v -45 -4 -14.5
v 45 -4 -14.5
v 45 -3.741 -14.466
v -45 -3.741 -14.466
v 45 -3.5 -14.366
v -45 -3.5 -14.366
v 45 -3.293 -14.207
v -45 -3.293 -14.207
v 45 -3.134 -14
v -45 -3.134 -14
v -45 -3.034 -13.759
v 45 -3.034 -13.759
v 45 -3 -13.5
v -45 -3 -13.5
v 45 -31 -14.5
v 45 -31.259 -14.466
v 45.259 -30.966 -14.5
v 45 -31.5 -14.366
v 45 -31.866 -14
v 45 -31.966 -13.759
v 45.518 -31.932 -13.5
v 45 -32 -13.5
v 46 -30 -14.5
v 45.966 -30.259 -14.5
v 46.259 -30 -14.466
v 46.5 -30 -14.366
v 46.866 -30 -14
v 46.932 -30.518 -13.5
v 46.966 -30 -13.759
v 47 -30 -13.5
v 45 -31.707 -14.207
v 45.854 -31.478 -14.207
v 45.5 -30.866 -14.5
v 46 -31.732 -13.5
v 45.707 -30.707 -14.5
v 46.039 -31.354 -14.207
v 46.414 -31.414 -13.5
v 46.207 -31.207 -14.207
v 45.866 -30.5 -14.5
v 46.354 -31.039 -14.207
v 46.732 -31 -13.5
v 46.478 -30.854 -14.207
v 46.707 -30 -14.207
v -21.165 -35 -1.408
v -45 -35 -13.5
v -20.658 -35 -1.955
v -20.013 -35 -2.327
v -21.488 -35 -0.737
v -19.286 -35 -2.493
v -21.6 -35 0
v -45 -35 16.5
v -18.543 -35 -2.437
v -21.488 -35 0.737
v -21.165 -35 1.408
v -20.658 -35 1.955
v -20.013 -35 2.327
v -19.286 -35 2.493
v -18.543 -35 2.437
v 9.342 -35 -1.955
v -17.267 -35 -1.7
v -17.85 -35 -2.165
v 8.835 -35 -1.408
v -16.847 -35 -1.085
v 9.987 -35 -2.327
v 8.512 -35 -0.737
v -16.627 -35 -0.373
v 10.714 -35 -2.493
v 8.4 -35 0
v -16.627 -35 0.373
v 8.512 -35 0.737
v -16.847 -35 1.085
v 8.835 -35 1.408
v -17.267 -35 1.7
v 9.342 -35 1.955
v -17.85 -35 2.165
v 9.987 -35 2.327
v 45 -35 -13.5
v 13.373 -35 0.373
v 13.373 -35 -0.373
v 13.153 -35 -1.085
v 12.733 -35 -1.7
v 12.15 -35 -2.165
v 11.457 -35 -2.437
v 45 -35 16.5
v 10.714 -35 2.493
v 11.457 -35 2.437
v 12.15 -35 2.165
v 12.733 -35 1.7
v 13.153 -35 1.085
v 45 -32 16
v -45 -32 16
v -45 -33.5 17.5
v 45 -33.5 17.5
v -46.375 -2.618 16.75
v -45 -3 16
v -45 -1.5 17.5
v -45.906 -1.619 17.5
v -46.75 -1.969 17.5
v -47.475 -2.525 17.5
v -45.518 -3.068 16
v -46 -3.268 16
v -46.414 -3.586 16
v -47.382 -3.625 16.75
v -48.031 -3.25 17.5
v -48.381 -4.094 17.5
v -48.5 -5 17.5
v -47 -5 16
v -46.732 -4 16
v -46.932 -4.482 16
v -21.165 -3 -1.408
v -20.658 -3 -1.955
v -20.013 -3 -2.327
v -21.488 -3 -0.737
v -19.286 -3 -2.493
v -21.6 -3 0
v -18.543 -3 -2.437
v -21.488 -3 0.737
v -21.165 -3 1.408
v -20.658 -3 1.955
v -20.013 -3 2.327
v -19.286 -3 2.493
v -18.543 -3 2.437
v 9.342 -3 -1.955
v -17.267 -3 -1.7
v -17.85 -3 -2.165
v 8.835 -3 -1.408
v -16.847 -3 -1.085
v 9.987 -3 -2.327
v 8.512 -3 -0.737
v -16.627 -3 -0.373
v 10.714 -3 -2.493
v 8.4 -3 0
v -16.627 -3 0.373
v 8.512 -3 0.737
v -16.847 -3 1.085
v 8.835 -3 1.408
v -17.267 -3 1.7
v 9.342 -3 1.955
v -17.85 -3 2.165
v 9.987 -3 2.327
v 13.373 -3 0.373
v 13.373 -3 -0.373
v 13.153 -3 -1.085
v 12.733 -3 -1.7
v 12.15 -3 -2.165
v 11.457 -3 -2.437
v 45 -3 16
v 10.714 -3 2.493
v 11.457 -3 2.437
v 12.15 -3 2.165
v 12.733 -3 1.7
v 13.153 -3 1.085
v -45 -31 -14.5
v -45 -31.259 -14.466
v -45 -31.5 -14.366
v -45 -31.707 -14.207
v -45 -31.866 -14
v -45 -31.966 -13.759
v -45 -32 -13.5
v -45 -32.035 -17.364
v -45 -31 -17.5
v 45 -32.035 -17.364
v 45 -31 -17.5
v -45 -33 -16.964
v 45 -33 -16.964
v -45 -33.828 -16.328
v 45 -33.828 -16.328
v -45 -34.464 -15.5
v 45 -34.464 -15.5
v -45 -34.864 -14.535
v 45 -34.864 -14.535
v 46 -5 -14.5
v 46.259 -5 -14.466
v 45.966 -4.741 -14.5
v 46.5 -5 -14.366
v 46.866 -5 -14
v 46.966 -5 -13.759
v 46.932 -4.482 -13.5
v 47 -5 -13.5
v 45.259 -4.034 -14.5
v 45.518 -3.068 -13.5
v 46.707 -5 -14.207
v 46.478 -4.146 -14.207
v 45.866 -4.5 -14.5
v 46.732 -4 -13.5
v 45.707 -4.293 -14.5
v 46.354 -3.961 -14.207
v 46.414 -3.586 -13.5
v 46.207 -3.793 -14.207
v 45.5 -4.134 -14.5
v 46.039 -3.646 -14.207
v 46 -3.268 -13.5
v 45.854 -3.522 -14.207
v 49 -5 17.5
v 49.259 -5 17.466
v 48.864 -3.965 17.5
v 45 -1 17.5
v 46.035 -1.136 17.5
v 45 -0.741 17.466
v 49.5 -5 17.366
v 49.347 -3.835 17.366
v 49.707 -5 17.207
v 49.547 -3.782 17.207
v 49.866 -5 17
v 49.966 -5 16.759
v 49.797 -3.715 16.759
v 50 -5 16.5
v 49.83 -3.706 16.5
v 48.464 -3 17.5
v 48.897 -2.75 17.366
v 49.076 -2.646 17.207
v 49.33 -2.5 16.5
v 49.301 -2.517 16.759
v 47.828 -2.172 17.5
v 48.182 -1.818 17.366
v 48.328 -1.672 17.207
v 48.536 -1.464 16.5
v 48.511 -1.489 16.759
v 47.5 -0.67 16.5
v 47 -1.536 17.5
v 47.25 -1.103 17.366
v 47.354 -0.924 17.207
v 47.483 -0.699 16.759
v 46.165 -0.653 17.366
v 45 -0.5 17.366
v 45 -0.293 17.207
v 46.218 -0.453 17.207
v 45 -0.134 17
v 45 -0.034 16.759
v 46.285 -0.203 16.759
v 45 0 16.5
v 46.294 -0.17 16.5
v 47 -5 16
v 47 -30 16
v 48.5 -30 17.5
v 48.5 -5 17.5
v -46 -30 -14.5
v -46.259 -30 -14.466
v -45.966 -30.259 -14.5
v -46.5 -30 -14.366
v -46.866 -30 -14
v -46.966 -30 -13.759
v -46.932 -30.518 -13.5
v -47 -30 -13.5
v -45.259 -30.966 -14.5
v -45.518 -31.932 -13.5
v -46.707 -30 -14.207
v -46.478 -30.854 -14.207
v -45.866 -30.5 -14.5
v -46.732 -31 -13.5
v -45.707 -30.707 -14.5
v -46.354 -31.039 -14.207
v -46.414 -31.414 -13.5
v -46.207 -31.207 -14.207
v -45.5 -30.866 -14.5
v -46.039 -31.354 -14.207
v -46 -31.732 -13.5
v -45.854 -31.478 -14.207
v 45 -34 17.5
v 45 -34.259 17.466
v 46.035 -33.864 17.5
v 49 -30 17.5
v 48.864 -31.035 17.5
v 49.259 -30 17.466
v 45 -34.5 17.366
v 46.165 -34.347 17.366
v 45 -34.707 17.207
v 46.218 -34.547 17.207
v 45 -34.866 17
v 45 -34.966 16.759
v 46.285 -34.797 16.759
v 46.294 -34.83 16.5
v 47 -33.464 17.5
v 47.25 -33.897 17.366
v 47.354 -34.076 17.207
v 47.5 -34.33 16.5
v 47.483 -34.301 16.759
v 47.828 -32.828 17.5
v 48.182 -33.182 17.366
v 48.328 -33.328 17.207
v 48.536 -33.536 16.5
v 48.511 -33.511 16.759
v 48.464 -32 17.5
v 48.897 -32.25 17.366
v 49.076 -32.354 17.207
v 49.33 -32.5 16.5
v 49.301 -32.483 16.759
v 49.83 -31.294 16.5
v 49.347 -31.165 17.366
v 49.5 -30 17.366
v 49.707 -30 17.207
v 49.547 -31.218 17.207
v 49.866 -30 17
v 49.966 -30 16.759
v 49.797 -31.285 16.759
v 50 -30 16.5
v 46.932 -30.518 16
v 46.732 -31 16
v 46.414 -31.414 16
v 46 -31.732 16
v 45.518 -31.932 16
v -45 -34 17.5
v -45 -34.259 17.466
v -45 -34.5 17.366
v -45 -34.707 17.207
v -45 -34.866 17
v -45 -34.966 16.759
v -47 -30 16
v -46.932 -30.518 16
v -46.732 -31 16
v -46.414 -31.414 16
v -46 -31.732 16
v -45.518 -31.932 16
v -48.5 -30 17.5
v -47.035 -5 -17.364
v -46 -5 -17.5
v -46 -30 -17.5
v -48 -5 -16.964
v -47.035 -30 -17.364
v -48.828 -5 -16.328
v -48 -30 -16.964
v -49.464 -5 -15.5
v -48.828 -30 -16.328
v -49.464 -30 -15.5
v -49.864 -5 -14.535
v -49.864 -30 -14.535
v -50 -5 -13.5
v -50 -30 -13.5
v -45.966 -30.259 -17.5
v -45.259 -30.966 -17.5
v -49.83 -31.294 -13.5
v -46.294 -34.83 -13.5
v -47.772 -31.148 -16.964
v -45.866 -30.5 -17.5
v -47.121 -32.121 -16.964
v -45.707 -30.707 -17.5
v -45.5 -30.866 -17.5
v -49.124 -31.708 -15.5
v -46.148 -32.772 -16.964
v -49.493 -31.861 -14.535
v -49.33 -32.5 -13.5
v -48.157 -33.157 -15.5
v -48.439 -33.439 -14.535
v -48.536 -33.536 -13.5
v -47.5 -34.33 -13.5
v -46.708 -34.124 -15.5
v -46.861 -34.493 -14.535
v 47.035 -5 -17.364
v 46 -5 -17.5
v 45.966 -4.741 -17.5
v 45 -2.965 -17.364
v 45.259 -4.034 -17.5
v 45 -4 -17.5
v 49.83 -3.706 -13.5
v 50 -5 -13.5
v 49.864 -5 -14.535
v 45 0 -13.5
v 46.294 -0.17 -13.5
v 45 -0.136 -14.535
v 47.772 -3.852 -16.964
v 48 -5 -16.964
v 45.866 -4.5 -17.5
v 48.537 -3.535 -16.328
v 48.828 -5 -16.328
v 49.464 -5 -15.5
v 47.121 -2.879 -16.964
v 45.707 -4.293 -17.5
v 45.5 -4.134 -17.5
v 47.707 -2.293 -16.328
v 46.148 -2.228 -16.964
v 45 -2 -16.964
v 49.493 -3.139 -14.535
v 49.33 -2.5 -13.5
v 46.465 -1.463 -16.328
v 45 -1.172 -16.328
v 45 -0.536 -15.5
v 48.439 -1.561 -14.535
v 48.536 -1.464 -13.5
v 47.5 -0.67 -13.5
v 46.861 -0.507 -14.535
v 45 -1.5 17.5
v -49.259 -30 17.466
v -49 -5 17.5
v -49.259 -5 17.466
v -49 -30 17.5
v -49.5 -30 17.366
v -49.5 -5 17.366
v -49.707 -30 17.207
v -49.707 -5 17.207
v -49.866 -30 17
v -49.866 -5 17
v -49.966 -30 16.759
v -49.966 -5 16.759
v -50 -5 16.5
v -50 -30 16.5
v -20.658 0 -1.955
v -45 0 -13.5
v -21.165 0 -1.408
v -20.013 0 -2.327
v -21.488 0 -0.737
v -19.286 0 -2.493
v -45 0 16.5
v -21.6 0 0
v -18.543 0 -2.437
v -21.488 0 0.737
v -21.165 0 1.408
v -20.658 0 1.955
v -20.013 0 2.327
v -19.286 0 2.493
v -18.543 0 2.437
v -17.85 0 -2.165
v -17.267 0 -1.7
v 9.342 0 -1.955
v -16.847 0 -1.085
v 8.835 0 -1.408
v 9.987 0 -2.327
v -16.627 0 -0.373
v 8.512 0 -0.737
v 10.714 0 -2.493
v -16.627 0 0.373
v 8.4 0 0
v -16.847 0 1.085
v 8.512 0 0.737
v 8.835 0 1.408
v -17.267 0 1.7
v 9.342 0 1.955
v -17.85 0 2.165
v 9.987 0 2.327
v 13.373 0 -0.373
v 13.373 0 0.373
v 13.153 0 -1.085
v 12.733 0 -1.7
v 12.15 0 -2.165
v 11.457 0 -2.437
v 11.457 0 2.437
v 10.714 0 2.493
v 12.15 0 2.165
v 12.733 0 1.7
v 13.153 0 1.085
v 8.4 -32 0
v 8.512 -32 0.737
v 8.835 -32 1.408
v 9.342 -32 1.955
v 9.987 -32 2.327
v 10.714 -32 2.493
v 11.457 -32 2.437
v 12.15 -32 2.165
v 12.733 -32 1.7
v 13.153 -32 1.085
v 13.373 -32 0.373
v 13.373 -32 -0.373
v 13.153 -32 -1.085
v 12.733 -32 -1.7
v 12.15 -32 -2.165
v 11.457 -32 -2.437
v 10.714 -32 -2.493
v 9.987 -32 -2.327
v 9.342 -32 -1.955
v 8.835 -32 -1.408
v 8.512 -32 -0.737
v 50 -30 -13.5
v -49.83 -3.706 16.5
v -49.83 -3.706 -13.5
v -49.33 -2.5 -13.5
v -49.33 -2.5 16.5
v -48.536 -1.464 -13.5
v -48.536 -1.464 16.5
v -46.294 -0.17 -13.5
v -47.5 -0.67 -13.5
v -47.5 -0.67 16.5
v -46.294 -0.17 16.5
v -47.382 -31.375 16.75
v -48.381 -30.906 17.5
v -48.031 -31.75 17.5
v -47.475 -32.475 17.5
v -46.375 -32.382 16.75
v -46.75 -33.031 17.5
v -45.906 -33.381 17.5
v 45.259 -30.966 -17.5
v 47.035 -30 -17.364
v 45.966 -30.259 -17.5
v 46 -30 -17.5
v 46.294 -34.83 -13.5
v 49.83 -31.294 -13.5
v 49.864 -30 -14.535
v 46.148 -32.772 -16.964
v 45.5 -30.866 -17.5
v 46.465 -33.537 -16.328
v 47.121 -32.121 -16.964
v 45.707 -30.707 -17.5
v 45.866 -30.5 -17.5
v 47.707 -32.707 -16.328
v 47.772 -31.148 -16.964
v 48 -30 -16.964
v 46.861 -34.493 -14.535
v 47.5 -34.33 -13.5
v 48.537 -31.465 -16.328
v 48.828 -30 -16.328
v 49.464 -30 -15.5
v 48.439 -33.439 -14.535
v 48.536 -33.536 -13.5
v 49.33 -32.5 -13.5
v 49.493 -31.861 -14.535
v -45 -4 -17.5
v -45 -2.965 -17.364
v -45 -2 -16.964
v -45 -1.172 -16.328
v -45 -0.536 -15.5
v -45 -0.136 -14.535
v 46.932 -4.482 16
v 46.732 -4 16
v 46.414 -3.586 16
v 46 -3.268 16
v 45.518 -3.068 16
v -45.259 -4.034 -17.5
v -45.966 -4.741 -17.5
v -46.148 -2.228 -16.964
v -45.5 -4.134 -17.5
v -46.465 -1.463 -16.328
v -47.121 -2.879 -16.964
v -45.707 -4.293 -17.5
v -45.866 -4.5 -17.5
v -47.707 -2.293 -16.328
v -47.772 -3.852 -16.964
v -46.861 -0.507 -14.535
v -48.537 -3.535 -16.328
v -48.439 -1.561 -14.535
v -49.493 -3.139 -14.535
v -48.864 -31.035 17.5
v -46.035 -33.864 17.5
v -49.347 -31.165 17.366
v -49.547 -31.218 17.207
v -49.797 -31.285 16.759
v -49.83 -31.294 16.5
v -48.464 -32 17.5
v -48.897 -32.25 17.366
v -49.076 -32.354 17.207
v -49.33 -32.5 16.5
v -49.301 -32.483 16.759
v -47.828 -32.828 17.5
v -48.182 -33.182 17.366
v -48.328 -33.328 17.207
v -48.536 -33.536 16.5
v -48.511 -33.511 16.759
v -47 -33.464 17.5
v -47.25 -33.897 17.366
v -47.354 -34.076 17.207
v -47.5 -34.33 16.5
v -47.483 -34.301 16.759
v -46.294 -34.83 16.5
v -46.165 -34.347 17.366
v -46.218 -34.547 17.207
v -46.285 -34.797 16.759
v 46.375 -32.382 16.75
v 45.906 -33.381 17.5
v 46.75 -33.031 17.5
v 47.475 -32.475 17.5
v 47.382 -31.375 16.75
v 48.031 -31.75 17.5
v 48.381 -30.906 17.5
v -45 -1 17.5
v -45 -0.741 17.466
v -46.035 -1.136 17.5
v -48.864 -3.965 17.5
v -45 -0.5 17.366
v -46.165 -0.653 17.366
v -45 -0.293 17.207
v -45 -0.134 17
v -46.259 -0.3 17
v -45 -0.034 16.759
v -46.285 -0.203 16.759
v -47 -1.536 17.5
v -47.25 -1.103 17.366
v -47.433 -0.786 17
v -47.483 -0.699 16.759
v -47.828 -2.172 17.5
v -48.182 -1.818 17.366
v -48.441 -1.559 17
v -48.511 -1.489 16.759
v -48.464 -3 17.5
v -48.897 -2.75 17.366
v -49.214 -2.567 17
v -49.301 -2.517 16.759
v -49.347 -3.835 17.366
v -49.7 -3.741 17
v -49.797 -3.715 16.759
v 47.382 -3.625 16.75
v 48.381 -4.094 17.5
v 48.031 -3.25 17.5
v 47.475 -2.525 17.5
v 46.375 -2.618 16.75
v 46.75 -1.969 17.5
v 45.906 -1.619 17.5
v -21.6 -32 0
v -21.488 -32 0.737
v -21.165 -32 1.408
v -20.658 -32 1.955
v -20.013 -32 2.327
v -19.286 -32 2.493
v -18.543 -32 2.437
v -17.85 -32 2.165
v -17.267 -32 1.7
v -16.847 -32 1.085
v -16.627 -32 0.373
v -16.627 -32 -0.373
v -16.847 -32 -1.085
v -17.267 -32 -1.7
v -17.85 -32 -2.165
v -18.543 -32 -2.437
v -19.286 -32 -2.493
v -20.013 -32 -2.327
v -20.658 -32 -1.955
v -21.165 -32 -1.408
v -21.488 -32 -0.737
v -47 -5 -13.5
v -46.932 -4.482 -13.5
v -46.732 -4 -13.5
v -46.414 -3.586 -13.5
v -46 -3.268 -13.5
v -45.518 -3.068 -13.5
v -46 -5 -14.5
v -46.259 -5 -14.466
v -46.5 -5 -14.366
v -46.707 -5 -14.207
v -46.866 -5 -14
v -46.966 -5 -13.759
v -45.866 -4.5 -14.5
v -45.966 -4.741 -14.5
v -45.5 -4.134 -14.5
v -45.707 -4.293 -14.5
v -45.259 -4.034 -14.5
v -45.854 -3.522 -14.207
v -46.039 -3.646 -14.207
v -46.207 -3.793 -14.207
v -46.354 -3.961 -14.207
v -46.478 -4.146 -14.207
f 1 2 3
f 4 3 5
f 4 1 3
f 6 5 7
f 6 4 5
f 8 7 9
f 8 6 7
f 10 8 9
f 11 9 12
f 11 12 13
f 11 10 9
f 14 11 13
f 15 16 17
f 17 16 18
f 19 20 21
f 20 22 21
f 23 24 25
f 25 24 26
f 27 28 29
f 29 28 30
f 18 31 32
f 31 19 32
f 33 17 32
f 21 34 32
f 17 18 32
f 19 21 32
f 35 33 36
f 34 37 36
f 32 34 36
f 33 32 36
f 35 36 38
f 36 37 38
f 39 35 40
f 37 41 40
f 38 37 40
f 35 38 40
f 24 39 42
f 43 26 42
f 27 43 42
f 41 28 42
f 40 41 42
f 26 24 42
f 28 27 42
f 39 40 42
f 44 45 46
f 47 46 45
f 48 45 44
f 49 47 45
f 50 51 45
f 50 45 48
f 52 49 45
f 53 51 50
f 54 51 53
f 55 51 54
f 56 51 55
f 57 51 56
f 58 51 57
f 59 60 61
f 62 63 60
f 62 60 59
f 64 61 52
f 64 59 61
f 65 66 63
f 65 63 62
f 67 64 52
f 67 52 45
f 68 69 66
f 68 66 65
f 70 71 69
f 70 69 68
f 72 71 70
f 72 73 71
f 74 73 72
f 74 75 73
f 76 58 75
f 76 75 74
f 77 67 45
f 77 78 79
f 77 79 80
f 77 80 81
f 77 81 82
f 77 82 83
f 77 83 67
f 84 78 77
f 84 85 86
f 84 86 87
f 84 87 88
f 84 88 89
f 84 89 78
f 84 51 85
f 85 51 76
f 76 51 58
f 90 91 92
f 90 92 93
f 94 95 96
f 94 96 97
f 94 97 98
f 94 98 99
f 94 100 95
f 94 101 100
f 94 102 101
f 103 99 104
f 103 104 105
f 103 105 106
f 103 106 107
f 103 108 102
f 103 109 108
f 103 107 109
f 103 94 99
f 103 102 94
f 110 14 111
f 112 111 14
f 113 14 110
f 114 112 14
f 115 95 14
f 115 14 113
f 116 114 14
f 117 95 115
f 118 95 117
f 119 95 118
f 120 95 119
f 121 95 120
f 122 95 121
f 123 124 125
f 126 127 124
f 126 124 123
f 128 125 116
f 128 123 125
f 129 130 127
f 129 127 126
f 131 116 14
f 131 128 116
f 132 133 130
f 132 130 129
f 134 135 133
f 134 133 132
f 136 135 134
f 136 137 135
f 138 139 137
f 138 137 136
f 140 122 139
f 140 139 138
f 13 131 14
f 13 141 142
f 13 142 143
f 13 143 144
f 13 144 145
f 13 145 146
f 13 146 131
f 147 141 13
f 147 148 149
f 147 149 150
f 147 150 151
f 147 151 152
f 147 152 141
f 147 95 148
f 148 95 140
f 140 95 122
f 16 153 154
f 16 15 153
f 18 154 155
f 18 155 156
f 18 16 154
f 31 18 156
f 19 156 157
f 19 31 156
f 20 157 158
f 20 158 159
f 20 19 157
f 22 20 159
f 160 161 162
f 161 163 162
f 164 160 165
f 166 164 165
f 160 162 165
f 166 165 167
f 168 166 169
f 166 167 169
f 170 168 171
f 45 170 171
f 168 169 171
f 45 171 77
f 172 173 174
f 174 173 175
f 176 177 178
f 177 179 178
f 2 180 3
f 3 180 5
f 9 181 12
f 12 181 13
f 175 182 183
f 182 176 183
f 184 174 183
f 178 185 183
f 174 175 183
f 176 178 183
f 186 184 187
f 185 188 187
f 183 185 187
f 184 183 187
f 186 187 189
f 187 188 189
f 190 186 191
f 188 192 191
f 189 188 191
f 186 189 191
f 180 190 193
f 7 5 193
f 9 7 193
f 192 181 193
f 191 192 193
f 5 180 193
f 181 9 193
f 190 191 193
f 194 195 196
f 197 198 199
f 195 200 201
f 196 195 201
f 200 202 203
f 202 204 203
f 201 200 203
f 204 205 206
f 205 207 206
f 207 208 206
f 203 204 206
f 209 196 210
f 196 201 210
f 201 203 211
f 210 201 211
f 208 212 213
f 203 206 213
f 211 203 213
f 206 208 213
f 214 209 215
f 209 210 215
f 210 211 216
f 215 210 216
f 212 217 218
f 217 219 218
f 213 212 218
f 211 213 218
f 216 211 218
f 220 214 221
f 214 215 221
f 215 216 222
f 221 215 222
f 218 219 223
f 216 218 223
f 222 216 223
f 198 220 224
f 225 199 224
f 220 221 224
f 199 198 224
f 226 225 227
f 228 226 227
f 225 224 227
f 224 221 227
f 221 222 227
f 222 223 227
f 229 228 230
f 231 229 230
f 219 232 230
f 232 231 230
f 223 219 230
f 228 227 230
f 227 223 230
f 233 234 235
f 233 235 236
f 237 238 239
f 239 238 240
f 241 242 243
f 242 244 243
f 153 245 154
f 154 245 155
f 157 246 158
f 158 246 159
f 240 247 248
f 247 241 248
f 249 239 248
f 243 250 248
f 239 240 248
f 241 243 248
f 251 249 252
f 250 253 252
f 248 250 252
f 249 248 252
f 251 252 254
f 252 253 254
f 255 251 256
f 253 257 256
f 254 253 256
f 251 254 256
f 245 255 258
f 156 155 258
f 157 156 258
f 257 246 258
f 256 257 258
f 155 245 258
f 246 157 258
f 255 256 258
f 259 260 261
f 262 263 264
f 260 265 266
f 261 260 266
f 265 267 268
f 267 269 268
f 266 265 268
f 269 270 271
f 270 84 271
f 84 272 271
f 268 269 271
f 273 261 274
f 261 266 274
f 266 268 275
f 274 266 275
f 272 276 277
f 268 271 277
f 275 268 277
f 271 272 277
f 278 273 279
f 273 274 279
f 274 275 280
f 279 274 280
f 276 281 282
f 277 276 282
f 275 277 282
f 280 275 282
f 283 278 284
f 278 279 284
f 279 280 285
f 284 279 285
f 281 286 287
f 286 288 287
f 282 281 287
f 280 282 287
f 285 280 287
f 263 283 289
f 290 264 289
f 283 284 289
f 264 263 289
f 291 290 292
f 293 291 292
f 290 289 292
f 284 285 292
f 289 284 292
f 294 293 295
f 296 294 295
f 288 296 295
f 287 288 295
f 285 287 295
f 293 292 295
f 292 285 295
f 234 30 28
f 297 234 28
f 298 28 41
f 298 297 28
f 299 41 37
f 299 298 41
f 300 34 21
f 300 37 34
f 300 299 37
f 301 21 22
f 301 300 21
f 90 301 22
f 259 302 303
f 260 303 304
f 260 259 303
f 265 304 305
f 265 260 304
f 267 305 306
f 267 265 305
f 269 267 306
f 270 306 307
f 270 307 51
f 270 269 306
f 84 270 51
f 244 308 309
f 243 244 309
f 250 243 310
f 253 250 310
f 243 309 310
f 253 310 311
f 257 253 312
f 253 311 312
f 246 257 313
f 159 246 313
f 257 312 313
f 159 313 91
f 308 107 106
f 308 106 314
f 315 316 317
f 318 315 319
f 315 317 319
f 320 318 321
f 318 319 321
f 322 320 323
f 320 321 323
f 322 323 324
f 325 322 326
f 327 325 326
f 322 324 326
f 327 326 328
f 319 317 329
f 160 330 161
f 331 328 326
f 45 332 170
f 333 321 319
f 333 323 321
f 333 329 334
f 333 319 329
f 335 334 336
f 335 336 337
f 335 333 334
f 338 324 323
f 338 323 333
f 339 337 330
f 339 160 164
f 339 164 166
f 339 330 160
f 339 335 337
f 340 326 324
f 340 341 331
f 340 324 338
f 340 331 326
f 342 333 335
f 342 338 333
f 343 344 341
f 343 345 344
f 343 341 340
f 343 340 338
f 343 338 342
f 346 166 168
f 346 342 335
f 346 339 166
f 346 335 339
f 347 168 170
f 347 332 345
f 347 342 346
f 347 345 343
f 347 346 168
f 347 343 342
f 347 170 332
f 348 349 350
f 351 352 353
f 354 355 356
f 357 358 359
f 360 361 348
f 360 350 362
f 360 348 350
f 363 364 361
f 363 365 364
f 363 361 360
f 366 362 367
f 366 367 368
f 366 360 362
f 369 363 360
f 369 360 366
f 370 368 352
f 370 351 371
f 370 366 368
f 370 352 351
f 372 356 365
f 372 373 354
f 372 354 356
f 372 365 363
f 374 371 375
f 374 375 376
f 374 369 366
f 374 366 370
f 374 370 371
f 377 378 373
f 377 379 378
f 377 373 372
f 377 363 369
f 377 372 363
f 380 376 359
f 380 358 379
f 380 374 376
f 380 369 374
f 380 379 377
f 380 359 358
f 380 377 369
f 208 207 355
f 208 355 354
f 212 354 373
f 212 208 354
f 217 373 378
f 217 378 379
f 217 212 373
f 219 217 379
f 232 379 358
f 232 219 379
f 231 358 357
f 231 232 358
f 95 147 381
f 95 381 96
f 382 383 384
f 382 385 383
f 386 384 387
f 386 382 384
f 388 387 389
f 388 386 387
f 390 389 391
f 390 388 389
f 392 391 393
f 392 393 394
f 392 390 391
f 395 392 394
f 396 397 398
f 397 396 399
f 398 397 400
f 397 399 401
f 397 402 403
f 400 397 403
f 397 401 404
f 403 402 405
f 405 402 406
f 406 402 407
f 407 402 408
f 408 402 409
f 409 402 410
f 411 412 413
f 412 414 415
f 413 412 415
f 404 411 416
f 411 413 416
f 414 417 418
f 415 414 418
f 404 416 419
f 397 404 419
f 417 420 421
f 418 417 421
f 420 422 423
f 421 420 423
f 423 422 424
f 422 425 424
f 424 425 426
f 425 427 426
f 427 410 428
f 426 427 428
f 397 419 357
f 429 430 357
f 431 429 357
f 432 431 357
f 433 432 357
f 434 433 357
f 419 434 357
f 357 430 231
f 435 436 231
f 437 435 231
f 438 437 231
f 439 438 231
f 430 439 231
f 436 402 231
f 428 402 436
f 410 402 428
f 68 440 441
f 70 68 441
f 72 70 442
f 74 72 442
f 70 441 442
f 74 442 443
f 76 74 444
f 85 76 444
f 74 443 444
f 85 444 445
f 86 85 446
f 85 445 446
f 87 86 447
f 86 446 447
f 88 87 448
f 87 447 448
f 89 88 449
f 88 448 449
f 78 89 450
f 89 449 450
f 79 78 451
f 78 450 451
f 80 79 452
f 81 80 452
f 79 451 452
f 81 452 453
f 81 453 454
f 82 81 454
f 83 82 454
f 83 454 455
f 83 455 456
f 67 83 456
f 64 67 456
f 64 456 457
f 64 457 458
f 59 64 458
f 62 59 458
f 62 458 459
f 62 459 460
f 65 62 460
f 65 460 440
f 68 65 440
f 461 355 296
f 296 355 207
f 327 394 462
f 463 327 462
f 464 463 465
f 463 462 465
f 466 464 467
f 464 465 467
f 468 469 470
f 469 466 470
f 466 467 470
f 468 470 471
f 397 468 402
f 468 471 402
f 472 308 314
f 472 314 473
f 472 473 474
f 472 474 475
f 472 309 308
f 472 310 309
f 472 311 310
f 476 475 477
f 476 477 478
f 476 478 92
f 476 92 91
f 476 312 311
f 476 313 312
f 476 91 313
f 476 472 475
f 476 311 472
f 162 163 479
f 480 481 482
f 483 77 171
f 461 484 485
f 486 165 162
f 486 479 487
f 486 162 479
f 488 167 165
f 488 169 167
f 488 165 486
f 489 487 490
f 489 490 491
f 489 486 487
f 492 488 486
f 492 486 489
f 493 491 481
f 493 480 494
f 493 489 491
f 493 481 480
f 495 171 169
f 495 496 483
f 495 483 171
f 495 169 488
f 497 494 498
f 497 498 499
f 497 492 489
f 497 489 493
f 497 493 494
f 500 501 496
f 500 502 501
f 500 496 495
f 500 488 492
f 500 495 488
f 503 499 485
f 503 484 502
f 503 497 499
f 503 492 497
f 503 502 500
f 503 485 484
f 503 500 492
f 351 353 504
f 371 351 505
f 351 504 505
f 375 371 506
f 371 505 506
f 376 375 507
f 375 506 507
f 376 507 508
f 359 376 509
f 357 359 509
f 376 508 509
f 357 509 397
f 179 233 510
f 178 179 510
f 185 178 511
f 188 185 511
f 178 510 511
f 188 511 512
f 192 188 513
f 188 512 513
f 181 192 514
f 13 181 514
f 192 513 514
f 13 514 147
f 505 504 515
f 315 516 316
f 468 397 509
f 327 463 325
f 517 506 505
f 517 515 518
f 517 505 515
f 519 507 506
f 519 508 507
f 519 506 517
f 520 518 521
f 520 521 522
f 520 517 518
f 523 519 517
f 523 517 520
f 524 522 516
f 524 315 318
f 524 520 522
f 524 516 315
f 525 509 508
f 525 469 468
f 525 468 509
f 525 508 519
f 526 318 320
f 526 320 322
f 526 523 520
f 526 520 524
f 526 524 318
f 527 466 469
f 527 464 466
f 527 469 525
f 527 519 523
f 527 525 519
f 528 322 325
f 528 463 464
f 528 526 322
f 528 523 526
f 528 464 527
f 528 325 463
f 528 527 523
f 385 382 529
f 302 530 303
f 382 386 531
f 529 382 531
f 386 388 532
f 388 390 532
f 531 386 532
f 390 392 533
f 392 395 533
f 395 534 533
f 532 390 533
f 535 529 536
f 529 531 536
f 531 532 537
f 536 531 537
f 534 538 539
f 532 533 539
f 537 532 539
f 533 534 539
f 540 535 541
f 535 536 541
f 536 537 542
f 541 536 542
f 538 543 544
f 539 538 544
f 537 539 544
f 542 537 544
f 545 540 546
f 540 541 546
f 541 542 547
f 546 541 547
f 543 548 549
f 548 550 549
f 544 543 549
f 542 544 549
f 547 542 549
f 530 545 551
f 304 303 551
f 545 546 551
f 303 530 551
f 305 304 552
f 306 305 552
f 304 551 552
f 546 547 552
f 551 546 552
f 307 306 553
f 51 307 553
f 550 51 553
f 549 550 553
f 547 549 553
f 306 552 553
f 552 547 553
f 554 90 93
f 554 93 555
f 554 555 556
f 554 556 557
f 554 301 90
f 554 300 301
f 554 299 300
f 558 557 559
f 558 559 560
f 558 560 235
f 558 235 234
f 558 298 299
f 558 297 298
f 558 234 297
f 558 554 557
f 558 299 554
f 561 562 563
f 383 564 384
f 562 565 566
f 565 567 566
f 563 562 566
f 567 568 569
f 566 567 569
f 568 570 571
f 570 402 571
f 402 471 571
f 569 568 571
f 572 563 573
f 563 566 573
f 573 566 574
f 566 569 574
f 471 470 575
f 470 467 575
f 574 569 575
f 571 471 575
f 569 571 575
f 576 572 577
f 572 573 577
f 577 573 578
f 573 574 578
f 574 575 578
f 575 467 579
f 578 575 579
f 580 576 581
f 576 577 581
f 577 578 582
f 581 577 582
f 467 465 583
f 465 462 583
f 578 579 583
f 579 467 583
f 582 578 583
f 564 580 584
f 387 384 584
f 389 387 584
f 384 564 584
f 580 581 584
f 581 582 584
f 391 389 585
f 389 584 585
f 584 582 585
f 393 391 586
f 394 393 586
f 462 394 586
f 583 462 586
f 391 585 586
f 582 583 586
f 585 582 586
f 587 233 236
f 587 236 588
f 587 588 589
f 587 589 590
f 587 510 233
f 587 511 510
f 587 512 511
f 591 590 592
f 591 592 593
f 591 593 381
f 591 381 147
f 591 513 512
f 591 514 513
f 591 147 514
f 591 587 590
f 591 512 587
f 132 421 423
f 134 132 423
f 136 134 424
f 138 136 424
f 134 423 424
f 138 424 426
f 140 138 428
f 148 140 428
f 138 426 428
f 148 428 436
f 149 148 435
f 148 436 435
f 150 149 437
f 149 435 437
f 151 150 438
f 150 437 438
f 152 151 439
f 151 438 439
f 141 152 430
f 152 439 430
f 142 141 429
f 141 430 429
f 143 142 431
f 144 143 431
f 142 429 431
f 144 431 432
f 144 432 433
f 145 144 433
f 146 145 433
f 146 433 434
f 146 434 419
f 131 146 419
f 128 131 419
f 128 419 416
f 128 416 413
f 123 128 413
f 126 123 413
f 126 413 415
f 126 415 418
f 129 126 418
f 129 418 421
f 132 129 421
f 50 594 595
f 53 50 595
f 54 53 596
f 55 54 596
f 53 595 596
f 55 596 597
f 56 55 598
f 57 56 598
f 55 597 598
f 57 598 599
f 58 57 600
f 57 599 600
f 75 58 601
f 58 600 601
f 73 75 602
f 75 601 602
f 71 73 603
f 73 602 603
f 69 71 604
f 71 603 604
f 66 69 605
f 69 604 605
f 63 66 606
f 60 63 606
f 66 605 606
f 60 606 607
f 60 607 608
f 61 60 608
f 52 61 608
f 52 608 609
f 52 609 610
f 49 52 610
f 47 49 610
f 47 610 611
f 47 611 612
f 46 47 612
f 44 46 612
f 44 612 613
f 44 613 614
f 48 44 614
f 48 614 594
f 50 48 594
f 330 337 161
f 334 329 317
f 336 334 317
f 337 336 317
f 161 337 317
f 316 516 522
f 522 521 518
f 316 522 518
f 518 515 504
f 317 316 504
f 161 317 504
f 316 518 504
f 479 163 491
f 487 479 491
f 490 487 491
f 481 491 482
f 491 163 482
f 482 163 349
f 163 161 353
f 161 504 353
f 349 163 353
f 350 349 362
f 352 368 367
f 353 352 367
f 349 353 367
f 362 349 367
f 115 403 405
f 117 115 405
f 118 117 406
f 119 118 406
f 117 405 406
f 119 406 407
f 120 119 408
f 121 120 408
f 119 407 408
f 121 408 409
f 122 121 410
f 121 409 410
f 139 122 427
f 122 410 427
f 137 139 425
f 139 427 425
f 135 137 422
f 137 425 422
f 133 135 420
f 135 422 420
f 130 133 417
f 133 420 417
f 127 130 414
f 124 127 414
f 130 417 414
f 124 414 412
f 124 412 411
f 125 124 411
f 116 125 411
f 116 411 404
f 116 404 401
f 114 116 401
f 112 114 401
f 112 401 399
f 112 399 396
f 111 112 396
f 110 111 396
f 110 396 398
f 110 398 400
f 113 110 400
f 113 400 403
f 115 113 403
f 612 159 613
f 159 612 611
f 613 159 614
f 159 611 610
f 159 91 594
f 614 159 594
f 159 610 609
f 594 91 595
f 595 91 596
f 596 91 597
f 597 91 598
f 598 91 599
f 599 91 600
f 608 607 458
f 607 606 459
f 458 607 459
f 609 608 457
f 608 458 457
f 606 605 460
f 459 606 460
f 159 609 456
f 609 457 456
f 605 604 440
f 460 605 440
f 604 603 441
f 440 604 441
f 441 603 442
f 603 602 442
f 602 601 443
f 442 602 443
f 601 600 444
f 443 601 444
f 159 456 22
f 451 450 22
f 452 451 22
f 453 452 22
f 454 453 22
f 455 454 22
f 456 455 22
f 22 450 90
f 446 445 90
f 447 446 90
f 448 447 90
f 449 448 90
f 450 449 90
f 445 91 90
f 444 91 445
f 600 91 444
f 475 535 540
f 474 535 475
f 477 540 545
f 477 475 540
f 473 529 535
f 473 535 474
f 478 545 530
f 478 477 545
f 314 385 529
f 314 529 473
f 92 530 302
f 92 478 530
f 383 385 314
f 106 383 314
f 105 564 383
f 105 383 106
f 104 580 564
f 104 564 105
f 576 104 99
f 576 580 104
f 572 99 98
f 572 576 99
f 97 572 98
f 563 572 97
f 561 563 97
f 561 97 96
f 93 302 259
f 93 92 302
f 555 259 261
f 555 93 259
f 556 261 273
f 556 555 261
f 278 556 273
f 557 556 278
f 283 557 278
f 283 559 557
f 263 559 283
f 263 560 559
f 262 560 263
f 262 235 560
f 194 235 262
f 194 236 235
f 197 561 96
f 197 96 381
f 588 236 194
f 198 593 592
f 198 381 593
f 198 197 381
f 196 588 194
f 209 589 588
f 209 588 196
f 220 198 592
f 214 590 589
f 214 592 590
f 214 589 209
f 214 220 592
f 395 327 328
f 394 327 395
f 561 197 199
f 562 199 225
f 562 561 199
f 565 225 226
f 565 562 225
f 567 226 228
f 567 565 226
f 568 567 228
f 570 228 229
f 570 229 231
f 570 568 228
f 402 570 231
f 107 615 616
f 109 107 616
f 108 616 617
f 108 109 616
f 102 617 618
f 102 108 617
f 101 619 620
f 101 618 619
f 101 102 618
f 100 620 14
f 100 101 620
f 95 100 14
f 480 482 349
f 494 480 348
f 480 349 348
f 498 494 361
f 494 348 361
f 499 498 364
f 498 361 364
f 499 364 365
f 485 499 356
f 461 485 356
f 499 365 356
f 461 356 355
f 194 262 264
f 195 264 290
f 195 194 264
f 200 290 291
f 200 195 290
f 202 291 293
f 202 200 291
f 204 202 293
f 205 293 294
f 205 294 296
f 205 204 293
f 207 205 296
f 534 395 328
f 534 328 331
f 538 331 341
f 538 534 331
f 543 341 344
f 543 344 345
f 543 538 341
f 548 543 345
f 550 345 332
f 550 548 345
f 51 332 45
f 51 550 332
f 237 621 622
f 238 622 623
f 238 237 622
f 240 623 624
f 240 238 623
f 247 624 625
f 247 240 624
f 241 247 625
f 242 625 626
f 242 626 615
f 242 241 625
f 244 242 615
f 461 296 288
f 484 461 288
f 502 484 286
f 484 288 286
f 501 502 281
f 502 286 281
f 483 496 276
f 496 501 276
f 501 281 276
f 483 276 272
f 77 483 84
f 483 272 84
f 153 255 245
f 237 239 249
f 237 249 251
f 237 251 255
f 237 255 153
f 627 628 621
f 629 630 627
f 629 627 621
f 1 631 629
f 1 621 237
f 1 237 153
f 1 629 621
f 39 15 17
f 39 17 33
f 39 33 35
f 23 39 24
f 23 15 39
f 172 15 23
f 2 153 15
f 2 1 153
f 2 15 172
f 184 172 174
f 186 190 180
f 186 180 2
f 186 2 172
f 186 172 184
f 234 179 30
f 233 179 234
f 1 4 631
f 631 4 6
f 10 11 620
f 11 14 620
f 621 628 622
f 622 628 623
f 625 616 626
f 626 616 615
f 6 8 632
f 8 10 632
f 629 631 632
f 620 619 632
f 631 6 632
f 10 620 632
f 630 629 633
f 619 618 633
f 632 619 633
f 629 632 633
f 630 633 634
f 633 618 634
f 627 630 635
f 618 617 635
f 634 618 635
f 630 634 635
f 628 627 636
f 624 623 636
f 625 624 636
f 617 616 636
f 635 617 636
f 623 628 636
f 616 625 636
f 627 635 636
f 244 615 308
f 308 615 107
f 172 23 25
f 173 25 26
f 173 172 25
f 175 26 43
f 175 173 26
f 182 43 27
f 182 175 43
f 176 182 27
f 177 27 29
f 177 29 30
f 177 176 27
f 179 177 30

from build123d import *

# Parameters (mm, degrees)
F0_W     = 100
F0_H     = 35
F1_DEPTH = 35
F2_R     = 5
F3_R     = 4
F4_T     = -3
F6_D     = 5
F7_SIZE  = 1.5
F8_R     = 1


with BuildPart() as f1:
    # F0 (on Front) → F1 (new body)
    with BuildSketch(Plane.XZ):
        Rectangle(F0_W, F0_H)
    extrude(amount=F1_DEPTH)

    # F2
    f2_edges = [f1.edges().sort_by_distance(p)[0] for p in [
        (50, -35, 0),
        (50, 0, 0),
        (-50, -35, 0),
        (-50, 0, 0),
    ]]
    fillet(f2_edges, radius=F2_R)

    # F3
    f3_edges = [f1.edges().sort_by_distance(p)[0] for p in [
        (0, -35, -17.5),
    ]]
    fillet(f3_edges, radius=F3_R)

    # F4
    f4_openings = [f1.faces().sort_by_distance(p)[0] for p in [
        (0, -17.5, 17.5),
    ]]
    offset(amount=F4_T, openings=f4_openings)

    # F6 (through all)
    with Locations(Plane.XZ.offset(35)):
        with Locations((-19.0995354205, 0), (10.9004645795, 0)):
            Hole(F6_D / 2)

    # F7
    f7_edges = [f1.edges().sort_by_distance(p)[0] for p in [
        (-47, -17.5, 17.5),
        (0, -3, 17.5),
        (47, -17.5, 17.5),
        (0, -32, 17.5),
    ]]
    chamfer(f7_edges, length=F7_SIZE)

    # F8
    f8_edges = [f1.edges().sort_by_distance(p)[0] for p in [
        (-50, -17.5, 17.5),
    ]]
    fillet(f8_edges, radius=F8_R)


solid = f1.part
